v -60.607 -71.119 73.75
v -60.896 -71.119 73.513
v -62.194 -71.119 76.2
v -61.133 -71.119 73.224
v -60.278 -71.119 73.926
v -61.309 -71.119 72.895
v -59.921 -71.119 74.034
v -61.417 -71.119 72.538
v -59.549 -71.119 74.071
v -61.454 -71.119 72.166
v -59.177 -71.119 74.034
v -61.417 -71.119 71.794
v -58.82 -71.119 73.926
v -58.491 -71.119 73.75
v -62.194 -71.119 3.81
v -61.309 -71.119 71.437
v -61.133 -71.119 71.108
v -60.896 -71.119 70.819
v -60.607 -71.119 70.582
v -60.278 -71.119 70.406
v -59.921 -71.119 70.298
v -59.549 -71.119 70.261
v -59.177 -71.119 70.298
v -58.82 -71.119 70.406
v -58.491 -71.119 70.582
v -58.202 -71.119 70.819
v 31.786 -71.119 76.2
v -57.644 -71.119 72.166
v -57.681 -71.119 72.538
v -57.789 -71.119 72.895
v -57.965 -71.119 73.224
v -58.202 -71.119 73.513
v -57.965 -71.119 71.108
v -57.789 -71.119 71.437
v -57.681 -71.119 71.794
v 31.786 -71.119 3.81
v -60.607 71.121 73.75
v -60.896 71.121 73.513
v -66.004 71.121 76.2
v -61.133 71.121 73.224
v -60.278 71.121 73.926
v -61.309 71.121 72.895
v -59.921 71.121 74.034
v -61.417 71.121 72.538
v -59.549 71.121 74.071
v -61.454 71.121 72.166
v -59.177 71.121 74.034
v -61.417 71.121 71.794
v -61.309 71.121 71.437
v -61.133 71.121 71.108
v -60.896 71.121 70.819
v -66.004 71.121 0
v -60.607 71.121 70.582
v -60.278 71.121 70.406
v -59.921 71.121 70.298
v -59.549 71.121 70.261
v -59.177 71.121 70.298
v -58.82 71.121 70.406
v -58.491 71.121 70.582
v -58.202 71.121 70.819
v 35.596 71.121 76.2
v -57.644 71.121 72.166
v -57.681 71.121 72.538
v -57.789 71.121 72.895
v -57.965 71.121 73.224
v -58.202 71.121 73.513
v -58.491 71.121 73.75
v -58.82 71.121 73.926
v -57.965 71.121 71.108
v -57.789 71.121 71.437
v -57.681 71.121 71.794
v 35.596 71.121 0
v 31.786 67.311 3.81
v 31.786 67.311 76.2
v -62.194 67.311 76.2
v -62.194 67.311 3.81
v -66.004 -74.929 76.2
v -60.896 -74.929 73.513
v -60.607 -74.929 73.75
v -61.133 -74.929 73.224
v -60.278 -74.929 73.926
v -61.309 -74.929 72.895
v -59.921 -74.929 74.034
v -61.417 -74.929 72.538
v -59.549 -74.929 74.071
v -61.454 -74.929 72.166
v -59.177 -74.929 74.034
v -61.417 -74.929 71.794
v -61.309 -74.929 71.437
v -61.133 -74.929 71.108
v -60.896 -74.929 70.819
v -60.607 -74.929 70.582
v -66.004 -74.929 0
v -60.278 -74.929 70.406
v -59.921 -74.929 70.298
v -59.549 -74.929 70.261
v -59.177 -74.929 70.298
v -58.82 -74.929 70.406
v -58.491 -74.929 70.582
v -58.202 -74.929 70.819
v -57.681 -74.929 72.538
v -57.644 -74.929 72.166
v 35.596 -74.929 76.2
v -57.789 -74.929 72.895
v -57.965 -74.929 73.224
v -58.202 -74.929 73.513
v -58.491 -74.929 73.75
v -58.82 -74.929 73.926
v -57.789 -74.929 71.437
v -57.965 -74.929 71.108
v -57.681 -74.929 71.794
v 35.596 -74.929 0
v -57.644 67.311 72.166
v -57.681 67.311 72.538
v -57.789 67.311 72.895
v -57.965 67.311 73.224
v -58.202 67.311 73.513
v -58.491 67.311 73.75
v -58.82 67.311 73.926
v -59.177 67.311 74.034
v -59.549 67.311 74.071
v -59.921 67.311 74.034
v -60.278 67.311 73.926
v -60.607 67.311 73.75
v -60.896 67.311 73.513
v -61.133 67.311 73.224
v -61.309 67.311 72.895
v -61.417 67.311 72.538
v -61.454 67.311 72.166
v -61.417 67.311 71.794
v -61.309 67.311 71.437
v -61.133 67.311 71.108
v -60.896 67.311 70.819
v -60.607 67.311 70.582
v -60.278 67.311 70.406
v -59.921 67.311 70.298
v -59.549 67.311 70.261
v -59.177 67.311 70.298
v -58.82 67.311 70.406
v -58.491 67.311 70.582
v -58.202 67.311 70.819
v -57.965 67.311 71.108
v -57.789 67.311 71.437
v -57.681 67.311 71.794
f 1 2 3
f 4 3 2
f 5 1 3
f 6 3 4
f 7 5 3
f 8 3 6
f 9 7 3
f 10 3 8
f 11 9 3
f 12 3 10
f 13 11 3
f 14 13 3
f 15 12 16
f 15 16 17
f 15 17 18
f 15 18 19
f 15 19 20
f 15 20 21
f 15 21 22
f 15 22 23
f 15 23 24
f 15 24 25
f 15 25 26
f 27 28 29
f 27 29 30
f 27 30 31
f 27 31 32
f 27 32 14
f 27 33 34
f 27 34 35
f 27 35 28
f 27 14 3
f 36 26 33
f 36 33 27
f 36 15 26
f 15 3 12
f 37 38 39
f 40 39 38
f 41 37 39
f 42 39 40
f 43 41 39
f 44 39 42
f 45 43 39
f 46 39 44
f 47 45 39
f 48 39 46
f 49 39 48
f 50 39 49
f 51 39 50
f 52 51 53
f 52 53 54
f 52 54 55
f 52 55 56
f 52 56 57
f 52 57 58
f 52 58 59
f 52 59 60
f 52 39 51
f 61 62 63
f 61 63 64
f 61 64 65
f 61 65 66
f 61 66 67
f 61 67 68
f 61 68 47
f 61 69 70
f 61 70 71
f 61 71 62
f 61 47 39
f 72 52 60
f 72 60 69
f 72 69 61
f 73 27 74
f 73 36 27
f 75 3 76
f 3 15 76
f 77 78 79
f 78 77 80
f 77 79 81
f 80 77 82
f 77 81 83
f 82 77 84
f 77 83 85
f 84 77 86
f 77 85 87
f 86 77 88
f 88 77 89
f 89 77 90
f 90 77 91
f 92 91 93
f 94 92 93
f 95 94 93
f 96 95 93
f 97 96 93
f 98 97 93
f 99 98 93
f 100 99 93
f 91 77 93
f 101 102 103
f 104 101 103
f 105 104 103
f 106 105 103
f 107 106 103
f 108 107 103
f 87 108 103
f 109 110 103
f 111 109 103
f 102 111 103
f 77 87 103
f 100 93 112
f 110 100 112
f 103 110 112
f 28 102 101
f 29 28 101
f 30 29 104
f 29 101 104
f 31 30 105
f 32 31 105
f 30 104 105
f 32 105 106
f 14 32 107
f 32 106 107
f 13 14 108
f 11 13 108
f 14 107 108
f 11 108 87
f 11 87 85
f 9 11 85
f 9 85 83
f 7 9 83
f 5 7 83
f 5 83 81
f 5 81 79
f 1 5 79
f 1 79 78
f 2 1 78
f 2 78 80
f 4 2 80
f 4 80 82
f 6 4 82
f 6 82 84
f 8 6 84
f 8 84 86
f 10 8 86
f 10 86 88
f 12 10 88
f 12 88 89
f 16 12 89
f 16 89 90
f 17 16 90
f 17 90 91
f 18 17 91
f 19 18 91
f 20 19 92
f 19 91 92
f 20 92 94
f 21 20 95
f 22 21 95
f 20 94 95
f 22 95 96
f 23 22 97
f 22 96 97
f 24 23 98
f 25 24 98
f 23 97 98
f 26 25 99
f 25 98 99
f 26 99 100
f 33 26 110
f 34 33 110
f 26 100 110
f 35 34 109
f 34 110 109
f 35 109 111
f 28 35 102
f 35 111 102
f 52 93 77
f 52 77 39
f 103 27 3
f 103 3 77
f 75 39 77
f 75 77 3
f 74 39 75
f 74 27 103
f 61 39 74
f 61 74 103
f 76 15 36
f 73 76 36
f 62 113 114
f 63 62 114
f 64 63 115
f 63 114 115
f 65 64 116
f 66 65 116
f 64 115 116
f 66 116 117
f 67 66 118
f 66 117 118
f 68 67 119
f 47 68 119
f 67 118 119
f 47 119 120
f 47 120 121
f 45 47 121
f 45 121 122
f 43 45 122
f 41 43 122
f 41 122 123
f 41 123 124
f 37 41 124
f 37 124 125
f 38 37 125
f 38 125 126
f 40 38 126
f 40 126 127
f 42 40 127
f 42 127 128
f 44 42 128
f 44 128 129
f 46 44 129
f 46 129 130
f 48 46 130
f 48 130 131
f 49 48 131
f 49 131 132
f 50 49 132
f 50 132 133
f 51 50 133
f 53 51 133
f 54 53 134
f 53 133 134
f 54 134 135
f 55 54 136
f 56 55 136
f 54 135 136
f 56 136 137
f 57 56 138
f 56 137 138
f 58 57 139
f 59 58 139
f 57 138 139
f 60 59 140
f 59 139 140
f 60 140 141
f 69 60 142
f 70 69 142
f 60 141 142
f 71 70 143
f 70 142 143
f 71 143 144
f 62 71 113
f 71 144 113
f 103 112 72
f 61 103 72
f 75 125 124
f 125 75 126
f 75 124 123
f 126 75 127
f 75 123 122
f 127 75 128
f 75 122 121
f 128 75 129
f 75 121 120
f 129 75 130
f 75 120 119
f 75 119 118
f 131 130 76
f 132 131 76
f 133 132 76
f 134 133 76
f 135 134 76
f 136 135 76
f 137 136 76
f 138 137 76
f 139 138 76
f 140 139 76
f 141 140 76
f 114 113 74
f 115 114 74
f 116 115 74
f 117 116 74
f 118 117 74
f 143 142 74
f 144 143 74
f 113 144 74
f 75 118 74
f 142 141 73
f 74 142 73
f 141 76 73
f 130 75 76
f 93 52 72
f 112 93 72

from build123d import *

# Parameters (mm, degrees)
F0_W     = 101.6
F0_H     = 146.05
F1_DEPTH = 76.2
F2_T     = -3.81
F4_D     = 3.81


with BuildPart() as f1:
    # F0 (on Top) → F1 (new body)
    with BuildSketch(Plane.XY):
        with Locations((-15.204069, -1.90385)):
            Rectangle(F0_W, F0_H)
    extrude(amount=F1_DEPTH)

    # F2
    f2_openings = [f1.faces().sort_by_distance(p)[0] for p in [
        (-15.204069, -1.90385, 76.2),
    ]]
    offset(amount=F2_T, openings=f2_openings)

    # F4 (through all)
    with Locations(Plane(origin=(0, 71.12115, 0), x_dir=(-1, 0, 0), z_dir=(0, 1, 0))):
        with Locations((59.548918, 72.165899)):
            Hole(F4_D / 2)


solid = f1.part
